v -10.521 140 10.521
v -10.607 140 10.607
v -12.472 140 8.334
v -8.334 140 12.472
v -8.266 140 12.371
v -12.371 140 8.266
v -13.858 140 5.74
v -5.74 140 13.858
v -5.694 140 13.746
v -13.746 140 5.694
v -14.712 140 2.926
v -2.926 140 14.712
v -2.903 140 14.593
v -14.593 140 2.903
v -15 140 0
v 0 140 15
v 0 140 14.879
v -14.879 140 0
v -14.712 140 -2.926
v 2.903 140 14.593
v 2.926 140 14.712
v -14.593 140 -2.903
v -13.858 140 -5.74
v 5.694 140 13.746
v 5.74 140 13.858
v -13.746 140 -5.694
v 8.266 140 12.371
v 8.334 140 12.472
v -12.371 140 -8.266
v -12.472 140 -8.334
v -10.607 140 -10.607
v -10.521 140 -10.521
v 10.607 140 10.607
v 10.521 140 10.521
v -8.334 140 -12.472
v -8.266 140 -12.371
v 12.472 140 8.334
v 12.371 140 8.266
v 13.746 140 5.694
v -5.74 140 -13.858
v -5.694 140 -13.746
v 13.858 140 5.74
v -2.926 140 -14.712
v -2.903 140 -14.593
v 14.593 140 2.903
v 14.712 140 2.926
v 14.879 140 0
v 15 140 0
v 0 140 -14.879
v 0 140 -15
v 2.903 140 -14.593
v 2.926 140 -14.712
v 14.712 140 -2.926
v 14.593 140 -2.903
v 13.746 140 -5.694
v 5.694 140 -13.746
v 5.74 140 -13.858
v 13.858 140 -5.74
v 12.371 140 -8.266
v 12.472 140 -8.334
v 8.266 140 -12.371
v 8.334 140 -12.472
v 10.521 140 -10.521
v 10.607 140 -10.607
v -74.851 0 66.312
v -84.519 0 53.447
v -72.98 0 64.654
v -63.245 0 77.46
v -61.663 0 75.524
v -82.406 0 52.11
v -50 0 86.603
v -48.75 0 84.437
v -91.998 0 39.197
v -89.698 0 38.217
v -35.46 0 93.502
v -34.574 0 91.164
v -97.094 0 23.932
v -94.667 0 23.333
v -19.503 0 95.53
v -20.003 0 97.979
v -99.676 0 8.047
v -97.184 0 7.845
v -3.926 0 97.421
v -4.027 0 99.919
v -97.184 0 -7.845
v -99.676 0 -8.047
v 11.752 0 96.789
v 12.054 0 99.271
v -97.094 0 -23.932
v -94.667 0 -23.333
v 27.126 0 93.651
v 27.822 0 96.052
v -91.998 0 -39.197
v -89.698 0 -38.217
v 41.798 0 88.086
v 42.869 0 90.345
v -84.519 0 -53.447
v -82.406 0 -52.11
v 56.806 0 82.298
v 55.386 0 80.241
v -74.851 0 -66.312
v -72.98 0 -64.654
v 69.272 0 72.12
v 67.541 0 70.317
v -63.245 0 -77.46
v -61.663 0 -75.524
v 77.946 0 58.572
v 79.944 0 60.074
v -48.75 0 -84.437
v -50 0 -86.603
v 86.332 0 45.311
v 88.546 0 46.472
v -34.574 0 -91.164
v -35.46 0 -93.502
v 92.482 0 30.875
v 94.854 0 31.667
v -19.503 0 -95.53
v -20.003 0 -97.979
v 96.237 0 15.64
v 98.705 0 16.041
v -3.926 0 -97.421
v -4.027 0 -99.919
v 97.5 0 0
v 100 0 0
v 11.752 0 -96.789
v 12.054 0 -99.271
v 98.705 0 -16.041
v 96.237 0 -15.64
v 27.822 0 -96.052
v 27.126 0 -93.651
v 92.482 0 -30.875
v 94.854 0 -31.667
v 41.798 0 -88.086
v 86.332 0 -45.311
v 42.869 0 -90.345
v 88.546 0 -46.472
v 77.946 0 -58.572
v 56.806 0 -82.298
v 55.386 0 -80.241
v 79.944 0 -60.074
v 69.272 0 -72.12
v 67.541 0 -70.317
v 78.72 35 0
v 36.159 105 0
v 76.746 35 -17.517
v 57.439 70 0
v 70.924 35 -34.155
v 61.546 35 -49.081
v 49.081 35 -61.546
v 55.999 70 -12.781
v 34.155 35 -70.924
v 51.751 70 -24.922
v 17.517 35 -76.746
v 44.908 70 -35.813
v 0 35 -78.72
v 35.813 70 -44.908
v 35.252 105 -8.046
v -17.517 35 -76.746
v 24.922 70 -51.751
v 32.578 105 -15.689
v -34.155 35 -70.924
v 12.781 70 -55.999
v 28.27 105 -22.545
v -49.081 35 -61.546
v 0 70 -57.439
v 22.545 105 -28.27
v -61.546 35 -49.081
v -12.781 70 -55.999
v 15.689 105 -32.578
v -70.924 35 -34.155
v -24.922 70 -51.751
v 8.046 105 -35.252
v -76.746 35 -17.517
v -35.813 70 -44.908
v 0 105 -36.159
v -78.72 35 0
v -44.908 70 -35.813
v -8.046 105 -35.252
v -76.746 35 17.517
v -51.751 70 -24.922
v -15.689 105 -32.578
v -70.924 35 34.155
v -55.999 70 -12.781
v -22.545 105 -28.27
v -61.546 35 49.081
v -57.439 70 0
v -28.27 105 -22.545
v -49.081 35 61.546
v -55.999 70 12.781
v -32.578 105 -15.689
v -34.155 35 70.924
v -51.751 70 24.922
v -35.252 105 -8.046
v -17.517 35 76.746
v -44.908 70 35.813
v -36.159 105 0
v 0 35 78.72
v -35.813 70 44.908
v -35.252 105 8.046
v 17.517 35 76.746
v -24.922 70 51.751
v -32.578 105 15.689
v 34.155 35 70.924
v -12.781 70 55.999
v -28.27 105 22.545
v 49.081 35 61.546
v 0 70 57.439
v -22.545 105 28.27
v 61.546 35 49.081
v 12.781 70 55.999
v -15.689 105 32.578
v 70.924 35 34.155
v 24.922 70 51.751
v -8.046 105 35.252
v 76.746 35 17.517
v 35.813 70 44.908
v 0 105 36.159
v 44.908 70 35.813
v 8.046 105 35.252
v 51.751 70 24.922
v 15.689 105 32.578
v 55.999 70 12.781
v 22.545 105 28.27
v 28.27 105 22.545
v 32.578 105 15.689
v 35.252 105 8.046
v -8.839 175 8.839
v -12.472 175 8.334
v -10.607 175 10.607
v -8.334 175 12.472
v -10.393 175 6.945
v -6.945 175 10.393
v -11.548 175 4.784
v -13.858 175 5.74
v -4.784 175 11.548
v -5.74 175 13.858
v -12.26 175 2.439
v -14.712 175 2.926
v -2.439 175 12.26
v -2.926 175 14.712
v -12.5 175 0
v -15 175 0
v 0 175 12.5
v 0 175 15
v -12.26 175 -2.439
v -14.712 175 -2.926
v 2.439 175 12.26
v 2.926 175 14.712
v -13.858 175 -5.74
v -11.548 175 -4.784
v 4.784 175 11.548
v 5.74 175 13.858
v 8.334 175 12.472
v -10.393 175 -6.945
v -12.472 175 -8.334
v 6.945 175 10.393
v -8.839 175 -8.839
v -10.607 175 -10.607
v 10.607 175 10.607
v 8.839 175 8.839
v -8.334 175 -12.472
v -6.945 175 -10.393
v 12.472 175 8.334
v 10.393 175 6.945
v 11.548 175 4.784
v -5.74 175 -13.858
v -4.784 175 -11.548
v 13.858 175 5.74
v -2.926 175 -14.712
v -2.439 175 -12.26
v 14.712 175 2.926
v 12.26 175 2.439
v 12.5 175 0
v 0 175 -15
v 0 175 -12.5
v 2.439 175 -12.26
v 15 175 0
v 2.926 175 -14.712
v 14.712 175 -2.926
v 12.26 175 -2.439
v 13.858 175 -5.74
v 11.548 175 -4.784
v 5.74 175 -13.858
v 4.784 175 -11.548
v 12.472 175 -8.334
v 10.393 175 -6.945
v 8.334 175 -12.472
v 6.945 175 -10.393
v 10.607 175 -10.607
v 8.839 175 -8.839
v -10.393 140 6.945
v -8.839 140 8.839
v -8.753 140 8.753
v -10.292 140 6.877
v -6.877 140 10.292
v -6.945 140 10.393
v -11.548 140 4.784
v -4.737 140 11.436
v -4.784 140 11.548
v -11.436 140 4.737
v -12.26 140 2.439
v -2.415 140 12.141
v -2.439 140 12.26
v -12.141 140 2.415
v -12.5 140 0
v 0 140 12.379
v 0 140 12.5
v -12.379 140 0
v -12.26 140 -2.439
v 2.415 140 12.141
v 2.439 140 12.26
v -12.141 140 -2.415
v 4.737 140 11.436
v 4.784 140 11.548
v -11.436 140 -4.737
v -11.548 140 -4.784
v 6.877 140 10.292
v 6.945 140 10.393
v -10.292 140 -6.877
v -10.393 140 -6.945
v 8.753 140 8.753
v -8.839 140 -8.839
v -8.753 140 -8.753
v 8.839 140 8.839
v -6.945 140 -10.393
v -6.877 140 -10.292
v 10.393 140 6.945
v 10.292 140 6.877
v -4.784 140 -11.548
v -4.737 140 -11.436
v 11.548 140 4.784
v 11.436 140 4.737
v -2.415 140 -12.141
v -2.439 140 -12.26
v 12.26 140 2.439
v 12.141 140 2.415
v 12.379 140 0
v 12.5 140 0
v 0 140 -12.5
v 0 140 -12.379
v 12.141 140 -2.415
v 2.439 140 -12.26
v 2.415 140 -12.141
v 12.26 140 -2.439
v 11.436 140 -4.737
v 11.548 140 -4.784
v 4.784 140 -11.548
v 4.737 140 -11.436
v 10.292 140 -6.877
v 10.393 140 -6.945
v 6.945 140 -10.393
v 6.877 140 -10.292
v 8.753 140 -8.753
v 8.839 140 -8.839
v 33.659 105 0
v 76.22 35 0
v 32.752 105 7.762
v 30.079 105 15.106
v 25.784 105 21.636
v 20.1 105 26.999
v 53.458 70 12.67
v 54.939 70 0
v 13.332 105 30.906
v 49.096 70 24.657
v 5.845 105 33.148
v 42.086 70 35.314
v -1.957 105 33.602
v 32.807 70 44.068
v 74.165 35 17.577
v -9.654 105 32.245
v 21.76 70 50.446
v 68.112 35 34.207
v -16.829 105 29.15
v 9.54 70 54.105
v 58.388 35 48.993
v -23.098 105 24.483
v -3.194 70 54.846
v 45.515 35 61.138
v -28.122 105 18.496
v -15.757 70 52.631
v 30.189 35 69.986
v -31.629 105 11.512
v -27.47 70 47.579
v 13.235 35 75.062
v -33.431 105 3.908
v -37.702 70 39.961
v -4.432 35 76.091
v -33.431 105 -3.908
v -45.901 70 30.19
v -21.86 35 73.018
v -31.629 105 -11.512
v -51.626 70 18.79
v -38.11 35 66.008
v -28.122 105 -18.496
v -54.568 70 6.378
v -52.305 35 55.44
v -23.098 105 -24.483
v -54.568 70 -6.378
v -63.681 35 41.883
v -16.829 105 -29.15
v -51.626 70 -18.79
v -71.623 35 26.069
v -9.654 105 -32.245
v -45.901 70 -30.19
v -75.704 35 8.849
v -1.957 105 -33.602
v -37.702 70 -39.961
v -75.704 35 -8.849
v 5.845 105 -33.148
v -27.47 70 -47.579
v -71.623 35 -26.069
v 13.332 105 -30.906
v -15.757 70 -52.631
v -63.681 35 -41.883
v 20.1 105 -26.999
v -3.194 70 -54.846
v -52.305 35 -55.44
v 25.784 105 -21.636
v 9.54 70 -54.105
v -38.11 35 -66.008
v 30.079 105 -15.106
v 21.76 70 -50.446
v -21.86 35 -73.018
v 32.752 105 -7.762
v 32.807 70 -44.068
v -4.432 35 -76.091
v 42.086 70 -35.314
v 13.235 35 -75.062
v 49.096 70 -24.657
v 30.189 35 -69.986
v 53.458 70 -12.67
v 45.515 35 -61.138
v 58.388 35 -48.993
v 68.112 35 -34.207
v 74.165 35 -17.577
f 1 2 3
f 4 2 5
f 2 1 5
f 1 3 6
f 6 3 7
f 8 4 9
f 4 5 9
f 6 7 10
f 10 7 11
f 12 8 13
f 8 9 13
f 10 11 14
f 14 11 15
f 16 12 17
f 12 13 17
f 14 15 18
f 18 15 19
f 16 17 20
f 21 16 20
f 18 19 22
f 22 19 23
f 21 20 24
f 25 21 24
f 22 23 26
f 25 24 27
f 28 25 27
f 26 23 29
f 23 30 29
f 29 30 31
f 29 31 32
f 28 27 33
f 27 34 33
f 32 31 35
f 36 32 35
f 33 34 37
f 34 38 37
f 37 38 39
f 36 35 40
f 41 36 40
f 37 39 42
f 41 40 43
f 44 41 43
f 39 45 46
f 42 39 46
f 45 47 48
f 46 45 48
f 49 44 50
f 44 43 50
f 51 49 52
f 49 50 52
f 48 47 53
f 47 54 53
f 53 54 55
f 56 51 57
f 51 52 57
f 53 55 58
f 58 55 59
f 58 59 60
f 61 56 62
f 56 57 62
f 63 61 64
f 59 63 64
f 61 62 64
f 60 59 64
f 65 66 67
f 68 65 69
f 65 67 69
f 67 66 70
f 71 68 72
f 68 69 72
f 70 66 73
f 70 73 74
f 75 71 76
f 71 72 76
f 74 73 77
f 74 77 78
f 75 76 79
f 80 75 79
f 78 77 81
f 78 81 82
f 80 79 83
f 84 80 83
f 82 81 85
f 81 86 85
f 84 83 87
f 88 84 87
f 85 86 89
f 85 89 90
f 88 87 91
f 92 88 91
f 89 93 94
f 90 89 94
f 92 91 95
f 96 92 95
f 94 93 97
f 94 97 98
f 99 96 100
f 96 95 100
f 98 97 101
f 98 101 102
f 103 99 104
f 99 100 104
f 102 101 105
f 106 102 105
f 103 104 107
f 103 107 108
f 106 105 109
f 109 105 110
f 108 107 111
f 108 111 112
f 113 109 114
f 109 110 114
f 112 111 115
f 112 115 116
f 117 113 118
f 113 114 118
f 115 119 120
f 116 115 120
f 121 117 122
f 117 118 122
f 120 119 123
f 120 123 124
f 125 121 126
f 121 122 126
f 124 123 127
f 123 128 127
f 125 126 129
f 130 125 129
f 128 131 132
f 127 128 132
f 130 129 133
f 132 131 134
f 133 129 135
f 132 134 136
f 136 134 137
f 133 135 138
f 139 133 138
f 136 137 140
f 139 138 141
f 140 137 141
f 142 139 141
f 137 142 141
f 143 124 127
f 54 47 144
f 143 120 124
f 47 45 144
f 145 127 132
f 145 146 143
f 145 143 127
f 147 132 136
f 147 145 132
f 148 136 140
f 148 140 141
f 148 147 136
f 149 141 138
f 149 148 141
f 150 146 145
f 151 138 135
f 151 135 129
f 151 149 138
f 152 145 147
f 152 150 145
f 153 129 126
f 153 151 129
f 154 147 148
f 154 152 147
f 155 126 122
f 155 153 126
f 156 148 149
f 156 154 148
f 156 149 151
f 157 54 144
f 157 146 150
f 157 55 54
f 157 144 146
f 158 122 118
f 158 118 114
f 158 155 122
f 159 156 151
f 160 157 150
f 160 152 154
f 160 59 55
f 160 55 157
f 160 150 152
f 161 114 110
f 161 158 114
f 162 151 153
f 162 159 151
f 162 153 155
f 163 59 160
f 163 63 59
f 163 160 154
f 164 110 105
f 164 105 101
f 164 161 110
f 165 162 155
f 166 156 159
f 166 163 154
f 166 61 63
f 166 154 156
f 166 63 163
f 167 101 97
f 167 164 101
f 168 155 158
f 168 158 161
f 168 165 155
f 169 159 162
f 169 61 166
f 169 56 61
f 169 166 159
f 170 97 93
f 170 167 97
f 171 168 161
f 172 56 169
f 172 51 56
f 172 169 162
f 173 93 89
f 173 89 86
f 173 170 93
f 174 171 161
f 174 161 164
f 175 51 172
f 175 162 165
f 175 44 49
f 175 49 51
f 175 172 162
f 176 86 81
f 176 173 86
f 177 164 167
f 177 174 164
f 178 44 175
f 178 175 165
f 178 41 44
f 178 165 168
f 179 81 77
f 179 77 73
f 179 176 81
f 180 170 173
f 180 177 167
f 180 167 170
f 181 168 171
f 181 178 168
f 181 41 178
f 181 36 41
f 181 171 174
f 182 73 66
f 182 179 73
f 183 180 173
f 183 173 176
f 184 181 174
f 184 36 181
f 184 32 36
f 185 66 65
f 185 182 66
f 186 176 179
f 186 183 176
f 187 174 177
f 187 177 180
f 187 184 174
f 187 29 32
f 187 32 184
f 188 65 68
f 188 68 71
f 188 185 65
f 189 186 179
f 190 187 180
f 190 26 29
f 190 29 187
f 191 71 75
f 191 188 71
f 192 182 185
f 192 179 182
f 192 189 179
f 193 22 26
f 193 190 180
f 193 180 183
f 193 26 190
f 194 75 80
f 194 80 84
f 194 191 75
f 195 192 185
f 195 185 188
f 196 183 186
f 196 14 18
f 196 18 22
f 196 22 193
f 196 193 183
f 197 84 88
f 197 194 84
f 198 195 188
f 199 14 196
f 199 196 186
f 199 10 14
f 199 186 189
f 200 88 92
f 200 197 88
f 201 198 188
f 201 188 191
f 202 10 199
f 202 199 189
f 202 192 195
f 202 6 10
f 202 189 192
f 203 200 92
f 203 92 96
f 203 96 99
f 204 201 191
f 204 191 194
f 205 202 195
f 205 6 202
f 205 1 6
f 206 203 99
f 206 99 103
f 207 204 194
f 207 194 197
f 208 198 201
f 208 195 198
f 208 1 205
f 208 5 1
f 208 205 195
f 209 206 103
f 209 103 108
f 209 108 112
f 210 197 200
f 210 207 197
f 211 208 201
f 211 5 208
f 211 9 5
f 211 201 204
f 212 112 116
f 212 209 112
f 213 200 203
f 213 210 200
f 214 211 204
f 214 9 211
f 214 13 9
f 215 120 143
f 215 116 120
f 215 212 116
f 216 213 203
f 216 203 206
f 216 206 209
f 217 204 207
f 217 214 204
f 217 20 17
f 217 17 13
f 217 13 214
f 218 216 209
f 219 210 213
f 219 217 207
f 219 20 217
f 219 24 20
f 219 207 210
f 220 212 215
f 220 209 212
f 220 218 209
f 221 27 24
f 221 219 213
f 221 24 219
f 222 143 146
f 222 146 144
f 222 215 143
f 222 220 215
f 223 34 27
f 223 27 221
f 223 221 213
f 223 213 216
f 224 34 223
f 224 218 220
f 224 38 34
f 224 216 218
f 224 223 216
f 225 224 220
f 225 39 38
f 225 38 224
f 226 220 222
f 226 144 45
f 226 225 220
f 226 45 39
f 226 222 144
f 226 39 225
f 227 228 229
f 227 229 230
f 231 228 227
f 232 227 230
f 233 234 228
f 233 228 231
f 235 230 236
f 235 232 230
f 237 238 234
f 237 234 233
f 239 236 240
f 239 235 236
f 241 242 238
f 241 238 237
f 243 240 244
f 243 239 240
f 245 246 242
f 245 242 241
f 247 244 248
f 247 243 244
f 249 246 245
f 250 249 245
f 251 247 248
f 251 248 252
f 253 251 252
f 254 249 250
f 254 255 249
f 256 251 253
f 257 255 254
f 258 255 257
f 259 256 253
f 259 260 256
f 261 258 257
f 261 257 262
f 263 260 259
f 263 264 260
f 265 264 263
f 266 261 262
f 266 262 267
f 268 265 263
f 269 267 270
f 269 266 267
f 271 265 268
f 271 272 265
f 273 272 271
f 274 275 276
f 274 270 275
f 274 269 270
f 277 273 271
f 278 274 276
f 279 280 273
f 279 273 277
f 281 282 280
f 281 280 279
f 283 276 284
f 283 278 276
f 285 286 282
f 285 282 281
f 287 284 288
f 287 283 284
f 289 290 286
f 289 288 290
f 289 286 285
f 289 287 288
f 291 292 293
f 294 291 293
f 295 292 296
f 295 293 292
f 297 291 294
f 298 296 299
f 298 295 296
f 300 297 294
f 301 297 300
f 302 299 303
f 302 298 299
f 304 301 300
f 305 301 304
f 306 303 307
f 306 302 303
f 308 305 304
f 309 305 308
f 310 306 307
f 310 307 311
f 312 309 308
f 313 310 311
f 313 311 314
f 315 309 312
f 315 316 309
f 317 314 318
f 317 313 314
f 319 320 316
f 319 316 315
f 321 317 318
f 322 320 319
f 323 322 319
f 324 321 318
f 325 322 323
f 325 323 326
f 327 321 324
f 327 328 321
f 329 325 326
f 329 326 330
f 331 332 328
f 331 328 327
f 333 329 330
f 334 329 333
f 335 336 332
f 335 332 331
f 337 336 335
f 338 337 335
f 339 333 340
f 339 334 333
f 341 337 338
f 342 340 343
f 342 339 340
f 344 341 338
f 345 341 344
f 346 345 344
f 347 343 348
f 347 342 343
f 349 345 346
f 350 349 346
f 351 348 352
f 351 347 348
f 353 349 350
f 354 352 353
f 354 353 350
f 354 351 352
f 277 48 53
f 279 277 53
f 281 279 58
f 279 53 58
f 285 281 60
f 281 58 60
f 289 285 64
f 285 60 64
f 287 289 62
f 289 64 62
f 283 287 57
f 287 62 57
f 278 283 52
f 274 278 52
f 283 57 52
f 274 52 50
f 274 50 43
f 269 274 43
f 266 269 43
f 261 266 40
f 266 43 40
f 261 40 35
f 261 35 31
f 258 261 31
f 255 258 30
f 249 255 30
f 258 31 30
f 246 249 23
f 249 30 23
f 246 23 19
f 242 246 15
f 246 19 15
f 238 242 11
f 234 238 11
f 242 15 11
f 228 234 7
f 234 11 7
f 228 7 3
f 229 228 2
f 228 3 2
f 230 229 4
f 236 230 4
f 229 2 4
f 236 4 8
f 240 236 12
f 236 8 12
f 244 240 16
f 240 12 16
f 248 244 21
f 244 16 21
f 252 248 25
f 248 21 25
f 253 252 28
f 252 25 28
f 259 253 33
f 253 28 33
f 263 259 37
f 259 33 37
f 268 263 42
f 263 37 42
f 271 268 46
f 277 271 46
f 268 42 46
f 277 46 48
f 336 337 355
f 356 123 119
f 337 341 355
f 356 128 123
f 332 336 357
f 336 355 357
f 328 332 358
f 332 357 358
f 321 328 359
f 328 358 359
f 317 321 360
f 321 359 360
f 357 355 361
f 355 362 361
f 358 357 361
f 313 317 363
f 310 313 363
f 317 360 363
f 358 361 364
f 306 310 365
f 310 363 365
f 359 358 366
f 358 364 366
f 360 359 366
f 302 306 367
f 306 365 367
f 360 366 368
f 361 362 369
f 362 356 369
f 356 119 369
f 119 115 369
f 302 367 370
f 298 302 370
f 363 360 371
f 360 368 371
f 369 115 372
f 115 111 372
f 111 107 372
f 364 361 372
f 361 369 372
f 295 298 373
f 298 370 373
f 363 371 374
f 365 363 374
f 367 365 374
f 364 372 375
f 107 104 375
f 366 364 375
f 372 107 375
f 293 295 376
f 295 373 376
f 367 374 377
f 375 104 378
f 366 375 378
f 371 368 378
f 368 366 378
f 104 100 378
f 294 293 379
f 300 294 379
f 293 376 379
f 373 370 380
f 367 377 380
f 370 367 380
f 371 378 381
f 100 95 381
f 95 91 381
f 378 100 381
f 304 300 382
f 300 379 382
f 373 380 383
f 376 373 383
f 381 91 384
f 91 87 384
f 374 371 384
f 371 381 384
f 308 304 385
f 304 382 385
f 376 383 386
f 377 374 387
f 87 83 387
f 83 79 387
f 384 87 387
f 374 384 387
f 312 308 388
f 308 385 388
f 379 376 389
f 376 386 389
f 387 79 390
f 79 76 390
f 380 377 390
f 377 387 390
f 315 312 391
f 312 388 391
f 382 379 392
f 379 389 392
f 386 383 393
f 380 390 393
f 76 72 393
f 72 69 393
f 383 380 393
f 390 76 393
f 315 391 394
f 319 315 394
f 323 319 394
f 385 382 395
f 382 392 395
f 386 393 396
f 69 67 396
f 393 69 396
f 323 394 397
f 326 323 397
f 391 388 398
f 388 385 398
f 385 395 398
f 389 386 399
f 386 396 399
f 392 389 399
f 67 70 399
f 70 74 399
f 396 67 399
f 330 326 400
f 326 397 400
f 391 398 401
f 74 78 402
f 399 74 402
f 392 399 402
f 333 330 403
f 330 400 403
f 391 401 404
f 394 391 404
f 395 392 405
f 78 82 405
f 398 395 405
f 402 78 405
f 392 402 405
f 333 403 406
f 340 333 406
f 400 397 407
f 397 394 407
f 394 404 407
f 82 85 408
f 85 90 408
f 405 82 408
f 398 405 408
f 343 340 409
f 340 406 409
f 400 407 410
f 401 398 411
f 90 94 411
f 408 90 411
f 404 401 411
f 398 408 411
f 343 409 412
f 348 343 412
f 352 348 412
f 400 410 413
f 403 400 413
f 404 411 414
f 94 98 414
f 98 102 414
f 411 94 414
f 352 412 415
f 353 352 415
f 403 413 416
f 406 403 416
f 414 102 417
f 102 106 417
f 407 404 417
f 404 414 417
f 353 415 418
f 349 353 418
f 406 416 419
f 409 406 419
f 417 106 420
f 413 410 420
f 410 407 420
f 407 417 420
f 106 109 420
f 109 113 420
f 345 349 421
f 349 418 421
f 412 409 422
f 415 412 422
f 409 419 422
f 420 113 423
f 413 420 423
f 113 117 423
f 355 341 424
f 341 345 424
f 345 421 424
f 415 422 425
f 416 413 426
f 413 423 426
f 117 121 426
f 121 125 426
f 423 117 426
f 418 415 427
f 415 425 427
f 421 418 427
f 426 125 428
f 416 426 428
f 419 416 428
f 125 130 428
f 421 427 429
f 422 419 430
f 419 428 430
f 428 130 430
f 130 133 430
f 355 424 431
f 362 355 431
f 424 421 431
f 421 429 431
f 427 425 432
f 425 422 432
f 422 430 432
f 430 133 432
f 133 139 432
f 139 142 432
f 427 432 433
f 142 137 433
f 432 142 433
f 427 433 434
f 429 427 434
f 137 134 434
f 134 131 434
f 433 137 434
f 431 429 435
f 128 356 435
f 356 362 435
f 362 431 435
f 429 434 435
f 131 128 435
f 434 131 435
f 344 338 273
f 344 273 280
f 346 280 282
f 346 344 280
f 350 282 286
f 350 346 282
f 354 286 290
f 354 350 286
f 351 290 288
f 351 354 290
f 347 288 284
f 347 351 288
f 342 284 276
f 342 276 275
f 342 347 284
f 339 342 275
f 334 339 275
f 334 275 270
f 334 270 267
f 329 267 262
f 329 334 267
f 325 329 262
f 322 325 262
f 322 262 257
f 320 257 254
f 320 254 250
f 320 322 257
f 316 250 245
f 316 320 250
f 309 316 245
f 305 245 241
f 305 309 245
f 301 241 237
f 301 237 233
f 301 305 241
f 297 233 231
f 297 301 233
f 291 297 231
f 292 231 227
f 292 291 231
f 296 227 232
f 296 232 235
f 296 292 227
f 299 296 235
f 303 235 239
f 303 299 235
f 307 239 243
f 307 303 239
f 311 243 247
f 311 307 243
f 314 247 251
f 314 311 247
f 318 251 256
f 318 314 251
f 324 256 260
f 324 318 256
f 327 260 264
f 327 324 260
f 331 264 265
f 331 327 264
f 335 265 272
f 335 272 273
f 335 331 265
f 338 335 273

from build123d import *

# Parameters (mm, degrees)
SKETCH1_R           = 100
BOSS_EXTRUDE3_DEPTH = 140
BOSS_EXTRUDE3_TAPER = 31.3
SKETCH2_R           = 97.5
CUT_EXTRUDE1_DEPTH  = 140
CUT_EXTRUDE1_DRAFT  = -31.3
SKETCH4_R           = 15
SKETCH4_R_2         = 12.5
EXTRUDE_THIN1_DEPTH = 35


with BuildPart() as part:
    # Sketch1 → Boss-Extrude3 (new body)
    with BuildSketch(Plane(origin=(0, 0, 0), x_dir=(1, 0, 0), z_dir=(0, 1, 0))):
        Circle(SKETCH1_R)
    extrude(amount=BOSS_EXTRUDE3_DEPTH, taper=BOSS_EXTRUDE3_TAPER)


with BuildPart() as cut_extrude1_tool:
    # Sketch2 → Cut-Extrude1 (with draft: the straight prism first)
    with BuildSketch(Plane.XZ):
        Circle(SKETCH2_R)
    extrude(amount=-CUT_EXTRUDE1_DEPTH)
    # Cut-Extrude1: the draft: its side faces are tilted about the plane it starts from
    cut_extrude1_sides = [cut_extrude1_tool.faces().sort_by_distance(p)[0] for p in [
        (-97.5, 70, 0),
    ]]
    draft(cut_extrude1_sides, Plane.XZ, CUT_EXTRUDE1_DRAFT)


with BuildPart() as part_1:
    add(part.part)

    # Cut-Extrude1: cut by cut_extrude1_tool
    add(cut_extrude1_tool.part, mode=Mode.SUBTRACT)

    # Sketch4 → Extrude-Thin1 (add)
    with BuildSketch(Plane(origin=(0, 140, 0), x_dir=(1, 0, 0), z_dir=(0, 1, 0))):
        Circle(SKETCH4_R)
        Circle(SKETCH4_R_2, mode=Mode.SUBTRACT)
    extrude(amount=EXTRUDE_THIN1_DEPTH)


solid = part_1.part
